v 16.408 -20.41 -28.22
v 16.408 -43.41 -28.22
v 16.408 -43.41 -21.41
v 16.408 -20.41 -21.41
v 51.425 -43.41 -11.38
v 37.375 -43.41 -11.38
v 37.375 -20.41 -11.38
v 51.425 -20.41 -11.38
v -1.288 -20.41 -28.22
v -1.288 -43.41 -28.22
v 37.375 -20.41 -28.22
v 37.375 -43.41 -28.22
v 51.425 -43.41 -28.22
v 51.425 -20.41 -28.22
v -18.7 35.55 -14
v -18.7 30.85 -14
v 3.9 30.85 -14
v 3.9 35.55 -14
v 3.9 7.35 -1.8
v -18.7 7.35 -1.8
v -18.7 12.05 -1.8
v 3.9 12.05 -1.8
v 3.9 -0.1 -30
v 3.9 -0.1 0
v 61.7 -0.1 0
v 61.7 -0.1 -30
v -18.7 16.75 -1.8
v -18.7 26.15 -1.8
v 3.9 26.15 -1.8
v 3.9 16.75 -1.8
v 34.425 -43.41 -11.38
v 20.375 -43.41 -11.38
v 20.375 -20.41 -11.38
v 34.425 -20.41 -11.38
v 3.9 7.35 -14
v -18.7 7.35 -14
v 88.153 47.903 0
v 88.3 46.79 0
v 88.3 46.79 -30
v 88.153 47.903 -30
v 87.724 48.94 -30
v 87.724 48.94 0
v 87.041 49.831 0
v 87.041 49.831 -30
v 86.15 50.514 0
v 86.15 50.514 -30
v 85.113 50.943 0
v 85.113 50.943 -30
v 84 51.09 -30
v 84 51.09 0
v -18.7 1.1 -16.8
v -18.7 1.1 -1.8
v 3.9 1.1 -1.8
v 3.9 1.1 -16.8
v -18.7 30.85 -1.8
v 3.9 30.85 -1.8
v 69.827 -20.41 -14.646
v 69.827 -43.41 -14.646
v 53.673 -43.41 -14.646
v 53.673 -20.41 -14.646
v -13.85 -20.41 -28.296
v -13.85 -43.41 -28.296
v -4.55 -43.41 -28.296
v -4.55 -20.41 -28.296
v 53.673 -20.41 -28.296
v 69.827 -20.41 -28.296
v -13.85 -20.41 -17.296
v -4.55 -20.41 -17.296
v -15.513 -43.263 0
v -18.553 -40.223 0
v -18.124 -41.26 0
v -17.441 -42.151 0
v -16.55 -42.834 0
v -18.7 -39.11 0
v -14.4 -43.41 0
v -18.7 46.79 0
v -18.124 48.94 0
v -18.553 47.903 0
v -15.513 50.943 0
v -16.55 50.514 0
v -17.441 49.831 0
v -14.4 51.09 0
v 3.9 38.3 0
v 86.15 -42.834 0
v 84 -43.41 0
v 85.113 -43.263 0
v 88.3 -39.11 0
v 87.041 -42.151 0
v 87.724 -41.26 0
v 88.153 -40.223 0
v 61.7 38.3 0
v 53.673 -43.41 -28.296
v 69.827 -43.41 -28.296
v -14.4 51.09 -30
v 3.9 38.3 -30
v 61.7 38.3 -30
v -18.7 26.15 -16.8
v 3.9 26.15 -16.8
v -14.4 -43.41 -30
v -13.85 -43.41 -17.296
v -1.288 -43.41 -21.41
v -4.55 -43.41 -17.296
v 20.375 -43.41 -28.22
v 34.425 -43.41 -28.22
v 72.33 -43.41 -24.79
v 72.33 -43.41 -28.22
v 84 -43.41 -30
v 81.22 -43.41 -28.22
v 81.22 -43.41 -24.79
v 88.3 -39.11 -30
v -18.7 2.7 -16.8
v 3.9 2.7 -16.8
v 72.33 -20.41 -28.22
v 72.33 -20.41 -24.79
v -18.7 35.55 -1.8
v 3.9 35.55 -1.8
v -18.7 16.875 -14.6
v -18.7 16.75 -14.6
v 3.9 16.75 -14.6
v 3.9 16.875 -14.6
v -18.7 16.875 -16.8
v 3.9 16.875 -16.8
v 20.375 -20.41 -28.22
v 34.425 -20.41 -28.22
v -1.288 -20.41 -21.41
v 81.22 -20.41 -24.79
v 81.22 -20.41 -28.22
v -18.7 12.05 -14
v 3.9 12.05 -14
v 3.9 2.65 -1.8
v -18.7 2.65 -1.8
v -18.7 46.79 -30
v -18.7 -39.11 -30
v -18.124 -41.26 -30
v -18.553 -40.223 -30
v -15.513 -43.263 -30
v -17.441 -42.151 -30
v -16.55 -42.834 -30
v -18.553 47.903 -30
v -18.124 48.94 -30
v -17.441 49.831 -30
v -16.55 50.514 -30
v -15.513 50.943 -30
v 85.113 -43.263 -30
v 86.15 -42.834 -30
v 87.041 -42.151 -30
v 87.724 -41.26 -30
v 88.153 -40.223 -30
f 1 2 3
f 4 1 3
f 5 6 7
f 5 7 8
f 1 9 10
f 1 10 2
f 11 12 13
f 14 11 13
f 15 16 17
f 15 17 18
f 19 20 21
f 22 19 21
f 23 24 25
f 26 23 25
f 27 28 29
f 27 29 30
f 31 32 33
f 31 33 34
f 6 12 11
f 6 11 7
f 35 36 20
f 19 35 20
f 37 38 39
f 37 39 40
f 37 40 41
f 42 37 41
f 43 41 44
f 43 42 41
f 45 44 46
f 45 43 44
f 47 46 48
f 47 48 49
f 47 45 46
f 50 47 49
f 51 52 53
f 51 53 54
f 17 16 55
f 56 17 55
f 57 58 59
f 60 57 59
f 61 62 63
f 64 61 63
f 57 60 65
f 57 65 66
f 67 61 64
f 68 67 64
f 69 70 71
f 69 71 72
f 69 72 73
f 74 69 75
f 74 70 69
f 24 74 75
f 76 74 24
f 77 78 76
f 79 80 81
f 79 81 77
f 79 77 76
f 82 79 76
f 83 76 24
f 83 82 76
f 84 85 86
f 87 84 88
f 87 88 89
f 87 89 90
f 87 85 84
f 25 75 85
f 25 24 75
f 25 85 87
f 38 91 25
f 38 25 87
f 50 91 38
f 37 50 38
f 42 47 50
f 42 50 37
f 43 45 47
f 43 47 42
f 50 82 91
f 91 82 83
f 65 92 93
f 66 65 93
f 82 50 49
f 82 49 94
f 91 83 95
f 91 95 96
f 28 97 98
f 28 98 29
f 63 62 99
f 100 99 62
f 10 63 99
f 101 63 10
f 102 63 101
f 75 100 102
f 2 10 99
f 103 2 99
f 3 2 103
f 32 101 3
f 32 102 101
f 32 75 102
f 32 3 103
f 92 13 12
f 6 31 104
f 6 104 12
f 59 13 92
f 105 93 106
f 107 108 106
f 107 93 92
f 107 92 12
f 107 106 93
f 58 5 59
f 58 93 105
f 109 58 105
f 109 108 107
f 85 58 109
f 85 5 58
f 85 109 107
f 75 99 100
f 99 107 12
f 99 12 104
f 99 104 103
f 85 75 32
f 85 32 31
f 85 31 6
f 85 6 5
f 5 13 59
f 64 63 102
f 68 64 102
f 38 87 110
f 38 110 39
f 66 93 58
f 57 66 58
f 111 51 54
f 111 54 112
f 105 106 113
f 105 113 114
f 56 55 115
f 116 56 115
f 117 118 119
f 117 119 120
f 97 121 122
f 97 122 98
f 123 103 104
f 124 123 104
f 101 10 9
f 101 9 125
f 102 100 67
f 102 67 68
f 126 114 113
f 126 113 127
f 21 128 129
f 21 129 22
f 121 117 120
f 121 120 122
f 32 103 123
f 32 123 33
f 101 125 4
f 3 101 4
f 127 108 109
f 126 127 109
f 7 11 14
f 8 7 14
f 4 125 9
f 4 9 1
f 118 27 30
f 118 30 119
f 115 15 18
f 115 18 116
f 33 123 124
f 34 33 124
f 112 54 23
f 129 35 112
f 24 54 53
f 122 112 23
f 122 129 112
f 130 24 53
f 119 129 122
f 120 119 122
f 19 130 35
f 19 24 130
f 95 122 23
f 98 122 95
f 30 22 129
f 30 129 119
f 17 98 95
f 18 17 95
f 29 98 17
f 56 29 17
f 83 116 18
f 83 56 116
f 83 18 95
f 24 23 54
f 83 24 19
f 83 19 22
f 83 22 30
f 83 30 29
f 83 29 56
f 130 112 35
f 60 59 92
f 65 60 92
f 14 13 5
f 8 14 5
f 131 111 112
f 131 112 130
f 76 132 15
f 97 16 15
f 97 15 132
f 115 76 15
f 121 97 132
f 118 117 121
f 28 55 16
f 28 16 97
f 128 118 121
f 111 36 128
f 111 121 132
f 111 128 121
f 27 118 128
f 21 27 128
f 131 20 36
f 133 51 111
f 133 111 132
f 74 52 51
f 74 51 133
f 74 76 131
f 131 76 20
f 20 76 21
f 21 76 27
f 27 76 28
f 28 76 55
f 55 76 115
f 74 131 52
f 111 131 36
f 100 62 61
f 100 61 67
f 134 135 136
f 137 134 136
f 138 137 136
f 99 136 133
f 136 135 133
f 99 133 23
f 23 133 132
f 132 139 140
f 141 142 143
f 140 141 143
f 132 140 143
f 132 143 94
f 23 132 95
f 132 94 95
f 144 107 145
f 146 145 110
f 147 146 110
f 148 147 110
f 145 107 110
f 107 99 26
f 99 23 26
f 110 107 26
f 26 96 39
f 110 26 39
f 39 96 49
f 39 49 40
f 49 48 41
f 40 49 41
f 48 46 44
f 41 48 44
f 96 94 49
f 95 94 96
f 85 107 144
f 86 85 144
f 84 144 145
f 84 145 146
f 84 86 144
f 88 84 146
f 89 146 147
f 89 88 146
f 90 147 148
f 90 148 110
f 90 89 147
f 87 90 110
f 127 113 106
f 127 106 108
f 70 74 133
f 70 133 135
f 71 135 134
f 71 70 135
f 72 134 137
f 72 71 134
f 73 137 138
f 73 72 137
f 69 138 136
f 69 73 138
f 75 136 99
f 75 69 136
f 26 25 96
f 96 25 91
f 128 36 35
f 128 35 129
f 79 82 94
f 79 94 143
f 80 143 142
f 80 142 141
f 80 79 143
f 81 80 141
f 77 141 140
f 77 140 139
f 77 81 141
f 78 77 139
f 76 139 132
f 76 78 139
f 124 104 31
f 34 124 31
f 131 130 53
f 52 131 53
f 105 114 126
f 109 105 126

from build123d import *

# Parameters (mm, degrees)
SKETCH1_W           = 57.8
SKETCH1_H           = 38.4
BOSS_EXTRUDE1_DEPTH = 30
SKETCH2_W           = 8.89
SKETCH2_H           = 3.43
SKETCH2_W_2         = 14.05
SKETCH2_H_2         = 16.84
SKETCH2_W_3         = 17.696
SKETCH2_H_3         = 6.81
SKETCH2_W_4         = 9.3
SKETCH2_H_4         = 11
CUT_EXTRUDE1_DEPTH  = 23
SKETCH3_W           = 12.2
SKETCH3_H           = 4.7
CUT_EXTRUDE2_DEPTH  = 23


with BuildPart() as part:
    # Sketch1 → Boss-Extrude1 (new body)
    with BuildSketch(Plane.XY):
        with BuildLine():
            Line((84, 51.09), (-14.4, 51.09))
            ThreePointArc((-14.4, 51.09), (-17.440559159, 49.830559159), (-18.7, 46.79))
            Line((-18.7, 46.79), (-18.7, -39.11))
            ThreePointArc((-18.7, -39.11), (-17.440559159, -42.150559159), (-14.4, -43.41))
            Line((-14.4, -43.41), (84, -43.41))
            ThreePointArc((84, -43.41), (87.040559159, -42.150559159), (88.3, -39.11))
            Line((88.3, -39.11), (88.3, 46.79))
            ThreePointArc((88.3, 46.79), (87.040559159, 49.830559159), (84, 51.09))
        make_face()
        with Locations((32.8, 19.1)):
            Rectangle(SKETCH1_W, SKETCH1_H, mode=Mode.SUBTRACT)
    extrude(amount=-BOSS_EXTRUDE1_DEPTH)

    # Sketch2 → Cut-Extrude1 (cut)
    with BuildSketch(Plane.XZ.offset(43.41)):
        with Locations((76.775, -26.5048)):
            Rectangle(SKETCH2_W, SKETCH2_H)
        Polygon((66.12, -28.296), (68.12, -28.296), (69.827, -28.296), (69.827, -14.646007205), (68.12, -14.646007205), (66.12, -14.646007205), (57.38, -14.646007205), (55.38, -14.646007205), (53.673, -14.646007205), (53.673, -28.296), (55.38, -28.296), (57.38, -28.296), align=None)
        with Locations((44.4, -19.7998)):
            Rectangle(SKETCH2_W_2, SKETCH2_H_2)
        with Locations((27.4, -19.7998)):
            Rectangle(SKETCH2_W_2, SKETCH2_H_2)
        with Locations((7.56, -24.8148)):
            Rectangle(SKETCH2_W_3, SKETCH2_H_3)
        with Locations((-9.2, -22.796)):
            Rectangle(SKETCH2_W_4, SKETCH2_H_4)
    extrude(amount=-CUT_EXTRUDE1_DEPTH, mode=Mode.SUBTRACT)

    # Sketch3 → Cut-Extrude2 (cut)
    with BuildSketch(Plane.ZY.offset(18.7)):
        with Locations((-7.9, 33.2)):
            Rectangle(SKETCH3_W, SKETCH3_H)
        Polygon((-16.8, 26.15), (-1.8, 26.15), (-1.8, 16.75), (-14.6, 16.75), (-14.6, 16.875), (-16.8, 16.875), align=None)
        with Locations((-7.9, 9.7)):
            Rectangle(SKETCH3_W, SKETCH3_H)
        Polygon((-1.8, 1.1), (-16.8, 1.1), (-16.8, 2.7), (-1.8, 2.65), align=None)
    extrude(amount=-CUT_EXTRUDE2_DEPTH, mode=Mode.SUBTRACT)


solid = part.part
